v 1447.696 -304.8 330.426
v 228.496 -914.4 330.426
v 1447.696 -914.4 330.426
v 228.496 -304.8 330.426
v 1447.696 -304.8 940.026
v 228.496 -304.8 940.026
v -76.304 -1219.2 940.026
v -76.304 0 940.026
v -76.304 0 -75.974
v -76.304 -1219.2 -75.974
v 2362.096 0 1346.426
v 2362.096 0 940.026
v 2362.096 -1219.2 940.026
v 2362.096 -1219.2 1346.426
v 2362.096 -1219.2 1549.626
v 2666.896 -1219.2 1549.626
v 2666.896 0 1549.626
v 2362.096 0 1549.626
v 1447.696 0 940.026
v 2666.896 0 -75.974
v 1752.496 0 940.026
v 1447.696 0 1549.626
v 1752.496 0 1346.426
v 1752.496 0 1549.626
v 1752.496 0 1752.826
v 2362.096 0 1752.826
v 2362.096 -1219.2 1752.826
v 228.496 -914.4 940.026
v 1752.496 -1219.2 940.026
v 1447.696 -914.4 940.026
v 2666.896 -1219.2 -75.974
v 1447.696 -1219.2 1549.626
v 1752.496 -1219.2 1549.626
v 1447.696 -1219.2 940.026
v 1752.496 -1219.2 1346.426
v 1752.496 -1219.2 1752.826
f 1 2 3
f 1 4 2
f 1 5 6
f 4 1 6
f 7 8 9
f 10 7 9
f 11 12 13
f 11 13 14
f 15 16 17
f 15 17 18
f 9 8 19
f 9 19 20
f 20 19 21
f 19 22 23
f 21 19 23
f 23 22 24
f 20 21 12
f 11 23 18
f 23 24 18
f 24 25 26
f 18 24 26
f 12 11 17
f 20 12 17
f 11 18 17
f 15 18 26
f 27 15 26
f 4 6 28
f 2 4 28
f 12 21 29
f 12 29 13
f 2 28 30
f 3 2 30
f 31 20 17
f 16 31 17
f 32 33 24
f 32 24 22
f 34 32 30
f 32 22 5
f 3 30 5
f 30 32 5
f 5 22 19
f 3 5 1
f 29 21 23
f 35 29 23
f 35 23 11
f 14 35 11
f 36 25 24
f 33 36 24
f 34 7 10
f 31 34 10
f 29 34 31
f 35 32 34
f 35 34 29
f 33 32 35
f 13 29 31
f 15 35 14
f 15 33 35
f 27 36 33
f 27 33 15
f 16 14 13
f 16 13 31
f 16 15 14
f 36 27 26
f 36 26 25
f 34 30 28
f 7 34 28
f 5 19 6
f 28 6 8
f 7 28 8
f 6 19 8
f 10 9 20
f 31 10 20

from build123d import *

# Parameters (mm, degrees)
F0_W     = 609.6
F0_H     = 406.4
F1_DEPTH = 1219.2
F2_W     = 609.6
F2_H     = 406.4
F3_DEPTH = 1219.201
F5_DEPTH = 609.6


with BuildPart() as f1:
    # F0 (on Front) → F1 (new body)
    with BuildSketch(Plane.XZ):
        Polygon((-76.304249, 940.026094), (-76.304249, -75.973906), (2666.895751, -75.973906), (2666.895751, 1549.626094), (2362.095751, 1549.626094), (2362.095751, 1752.826094), (1752.495751, 1752.826094), (1752.495751, 1549.626094), (1447.695751, 1549.626094), (1447.695751, 940.026094), align=None)
        with Locations((2057.295751, 1143.226094)):
            Rectangle(F0_W, F0_H, mode=Mode.SUBTRACT)
        with Locations((2057.295751, 1143.226094)):
            Rectangle(F0_W, F0_H)
    extrude(amount=F1_DEPTH)

    # F2 (on face) → F3 (cut, through all)
    with BuildSketch(Plane.XZ.offset(1219.2)):
        with Locations((2057.295751, 1143.226094)):
            Rectangle(F2_W, F2_H)
    extrude(amount=-F3_DEPTH, mode=Mode.SUBTRACT)

    # F4 (on face) → F5 (cut)
    with BuildSketch(Plane.XY.offset(940.026094)):
        Polygon((228.495751, -609.6), (228.495751, -914.4), (1447.695751, -914.4), (1447.695751, -304.8), (228.495751, -304.8), align=None)
    extrude(amount=-F5_DEPTH, mode=Mode.SUBTRACT)


solid = f1.part
